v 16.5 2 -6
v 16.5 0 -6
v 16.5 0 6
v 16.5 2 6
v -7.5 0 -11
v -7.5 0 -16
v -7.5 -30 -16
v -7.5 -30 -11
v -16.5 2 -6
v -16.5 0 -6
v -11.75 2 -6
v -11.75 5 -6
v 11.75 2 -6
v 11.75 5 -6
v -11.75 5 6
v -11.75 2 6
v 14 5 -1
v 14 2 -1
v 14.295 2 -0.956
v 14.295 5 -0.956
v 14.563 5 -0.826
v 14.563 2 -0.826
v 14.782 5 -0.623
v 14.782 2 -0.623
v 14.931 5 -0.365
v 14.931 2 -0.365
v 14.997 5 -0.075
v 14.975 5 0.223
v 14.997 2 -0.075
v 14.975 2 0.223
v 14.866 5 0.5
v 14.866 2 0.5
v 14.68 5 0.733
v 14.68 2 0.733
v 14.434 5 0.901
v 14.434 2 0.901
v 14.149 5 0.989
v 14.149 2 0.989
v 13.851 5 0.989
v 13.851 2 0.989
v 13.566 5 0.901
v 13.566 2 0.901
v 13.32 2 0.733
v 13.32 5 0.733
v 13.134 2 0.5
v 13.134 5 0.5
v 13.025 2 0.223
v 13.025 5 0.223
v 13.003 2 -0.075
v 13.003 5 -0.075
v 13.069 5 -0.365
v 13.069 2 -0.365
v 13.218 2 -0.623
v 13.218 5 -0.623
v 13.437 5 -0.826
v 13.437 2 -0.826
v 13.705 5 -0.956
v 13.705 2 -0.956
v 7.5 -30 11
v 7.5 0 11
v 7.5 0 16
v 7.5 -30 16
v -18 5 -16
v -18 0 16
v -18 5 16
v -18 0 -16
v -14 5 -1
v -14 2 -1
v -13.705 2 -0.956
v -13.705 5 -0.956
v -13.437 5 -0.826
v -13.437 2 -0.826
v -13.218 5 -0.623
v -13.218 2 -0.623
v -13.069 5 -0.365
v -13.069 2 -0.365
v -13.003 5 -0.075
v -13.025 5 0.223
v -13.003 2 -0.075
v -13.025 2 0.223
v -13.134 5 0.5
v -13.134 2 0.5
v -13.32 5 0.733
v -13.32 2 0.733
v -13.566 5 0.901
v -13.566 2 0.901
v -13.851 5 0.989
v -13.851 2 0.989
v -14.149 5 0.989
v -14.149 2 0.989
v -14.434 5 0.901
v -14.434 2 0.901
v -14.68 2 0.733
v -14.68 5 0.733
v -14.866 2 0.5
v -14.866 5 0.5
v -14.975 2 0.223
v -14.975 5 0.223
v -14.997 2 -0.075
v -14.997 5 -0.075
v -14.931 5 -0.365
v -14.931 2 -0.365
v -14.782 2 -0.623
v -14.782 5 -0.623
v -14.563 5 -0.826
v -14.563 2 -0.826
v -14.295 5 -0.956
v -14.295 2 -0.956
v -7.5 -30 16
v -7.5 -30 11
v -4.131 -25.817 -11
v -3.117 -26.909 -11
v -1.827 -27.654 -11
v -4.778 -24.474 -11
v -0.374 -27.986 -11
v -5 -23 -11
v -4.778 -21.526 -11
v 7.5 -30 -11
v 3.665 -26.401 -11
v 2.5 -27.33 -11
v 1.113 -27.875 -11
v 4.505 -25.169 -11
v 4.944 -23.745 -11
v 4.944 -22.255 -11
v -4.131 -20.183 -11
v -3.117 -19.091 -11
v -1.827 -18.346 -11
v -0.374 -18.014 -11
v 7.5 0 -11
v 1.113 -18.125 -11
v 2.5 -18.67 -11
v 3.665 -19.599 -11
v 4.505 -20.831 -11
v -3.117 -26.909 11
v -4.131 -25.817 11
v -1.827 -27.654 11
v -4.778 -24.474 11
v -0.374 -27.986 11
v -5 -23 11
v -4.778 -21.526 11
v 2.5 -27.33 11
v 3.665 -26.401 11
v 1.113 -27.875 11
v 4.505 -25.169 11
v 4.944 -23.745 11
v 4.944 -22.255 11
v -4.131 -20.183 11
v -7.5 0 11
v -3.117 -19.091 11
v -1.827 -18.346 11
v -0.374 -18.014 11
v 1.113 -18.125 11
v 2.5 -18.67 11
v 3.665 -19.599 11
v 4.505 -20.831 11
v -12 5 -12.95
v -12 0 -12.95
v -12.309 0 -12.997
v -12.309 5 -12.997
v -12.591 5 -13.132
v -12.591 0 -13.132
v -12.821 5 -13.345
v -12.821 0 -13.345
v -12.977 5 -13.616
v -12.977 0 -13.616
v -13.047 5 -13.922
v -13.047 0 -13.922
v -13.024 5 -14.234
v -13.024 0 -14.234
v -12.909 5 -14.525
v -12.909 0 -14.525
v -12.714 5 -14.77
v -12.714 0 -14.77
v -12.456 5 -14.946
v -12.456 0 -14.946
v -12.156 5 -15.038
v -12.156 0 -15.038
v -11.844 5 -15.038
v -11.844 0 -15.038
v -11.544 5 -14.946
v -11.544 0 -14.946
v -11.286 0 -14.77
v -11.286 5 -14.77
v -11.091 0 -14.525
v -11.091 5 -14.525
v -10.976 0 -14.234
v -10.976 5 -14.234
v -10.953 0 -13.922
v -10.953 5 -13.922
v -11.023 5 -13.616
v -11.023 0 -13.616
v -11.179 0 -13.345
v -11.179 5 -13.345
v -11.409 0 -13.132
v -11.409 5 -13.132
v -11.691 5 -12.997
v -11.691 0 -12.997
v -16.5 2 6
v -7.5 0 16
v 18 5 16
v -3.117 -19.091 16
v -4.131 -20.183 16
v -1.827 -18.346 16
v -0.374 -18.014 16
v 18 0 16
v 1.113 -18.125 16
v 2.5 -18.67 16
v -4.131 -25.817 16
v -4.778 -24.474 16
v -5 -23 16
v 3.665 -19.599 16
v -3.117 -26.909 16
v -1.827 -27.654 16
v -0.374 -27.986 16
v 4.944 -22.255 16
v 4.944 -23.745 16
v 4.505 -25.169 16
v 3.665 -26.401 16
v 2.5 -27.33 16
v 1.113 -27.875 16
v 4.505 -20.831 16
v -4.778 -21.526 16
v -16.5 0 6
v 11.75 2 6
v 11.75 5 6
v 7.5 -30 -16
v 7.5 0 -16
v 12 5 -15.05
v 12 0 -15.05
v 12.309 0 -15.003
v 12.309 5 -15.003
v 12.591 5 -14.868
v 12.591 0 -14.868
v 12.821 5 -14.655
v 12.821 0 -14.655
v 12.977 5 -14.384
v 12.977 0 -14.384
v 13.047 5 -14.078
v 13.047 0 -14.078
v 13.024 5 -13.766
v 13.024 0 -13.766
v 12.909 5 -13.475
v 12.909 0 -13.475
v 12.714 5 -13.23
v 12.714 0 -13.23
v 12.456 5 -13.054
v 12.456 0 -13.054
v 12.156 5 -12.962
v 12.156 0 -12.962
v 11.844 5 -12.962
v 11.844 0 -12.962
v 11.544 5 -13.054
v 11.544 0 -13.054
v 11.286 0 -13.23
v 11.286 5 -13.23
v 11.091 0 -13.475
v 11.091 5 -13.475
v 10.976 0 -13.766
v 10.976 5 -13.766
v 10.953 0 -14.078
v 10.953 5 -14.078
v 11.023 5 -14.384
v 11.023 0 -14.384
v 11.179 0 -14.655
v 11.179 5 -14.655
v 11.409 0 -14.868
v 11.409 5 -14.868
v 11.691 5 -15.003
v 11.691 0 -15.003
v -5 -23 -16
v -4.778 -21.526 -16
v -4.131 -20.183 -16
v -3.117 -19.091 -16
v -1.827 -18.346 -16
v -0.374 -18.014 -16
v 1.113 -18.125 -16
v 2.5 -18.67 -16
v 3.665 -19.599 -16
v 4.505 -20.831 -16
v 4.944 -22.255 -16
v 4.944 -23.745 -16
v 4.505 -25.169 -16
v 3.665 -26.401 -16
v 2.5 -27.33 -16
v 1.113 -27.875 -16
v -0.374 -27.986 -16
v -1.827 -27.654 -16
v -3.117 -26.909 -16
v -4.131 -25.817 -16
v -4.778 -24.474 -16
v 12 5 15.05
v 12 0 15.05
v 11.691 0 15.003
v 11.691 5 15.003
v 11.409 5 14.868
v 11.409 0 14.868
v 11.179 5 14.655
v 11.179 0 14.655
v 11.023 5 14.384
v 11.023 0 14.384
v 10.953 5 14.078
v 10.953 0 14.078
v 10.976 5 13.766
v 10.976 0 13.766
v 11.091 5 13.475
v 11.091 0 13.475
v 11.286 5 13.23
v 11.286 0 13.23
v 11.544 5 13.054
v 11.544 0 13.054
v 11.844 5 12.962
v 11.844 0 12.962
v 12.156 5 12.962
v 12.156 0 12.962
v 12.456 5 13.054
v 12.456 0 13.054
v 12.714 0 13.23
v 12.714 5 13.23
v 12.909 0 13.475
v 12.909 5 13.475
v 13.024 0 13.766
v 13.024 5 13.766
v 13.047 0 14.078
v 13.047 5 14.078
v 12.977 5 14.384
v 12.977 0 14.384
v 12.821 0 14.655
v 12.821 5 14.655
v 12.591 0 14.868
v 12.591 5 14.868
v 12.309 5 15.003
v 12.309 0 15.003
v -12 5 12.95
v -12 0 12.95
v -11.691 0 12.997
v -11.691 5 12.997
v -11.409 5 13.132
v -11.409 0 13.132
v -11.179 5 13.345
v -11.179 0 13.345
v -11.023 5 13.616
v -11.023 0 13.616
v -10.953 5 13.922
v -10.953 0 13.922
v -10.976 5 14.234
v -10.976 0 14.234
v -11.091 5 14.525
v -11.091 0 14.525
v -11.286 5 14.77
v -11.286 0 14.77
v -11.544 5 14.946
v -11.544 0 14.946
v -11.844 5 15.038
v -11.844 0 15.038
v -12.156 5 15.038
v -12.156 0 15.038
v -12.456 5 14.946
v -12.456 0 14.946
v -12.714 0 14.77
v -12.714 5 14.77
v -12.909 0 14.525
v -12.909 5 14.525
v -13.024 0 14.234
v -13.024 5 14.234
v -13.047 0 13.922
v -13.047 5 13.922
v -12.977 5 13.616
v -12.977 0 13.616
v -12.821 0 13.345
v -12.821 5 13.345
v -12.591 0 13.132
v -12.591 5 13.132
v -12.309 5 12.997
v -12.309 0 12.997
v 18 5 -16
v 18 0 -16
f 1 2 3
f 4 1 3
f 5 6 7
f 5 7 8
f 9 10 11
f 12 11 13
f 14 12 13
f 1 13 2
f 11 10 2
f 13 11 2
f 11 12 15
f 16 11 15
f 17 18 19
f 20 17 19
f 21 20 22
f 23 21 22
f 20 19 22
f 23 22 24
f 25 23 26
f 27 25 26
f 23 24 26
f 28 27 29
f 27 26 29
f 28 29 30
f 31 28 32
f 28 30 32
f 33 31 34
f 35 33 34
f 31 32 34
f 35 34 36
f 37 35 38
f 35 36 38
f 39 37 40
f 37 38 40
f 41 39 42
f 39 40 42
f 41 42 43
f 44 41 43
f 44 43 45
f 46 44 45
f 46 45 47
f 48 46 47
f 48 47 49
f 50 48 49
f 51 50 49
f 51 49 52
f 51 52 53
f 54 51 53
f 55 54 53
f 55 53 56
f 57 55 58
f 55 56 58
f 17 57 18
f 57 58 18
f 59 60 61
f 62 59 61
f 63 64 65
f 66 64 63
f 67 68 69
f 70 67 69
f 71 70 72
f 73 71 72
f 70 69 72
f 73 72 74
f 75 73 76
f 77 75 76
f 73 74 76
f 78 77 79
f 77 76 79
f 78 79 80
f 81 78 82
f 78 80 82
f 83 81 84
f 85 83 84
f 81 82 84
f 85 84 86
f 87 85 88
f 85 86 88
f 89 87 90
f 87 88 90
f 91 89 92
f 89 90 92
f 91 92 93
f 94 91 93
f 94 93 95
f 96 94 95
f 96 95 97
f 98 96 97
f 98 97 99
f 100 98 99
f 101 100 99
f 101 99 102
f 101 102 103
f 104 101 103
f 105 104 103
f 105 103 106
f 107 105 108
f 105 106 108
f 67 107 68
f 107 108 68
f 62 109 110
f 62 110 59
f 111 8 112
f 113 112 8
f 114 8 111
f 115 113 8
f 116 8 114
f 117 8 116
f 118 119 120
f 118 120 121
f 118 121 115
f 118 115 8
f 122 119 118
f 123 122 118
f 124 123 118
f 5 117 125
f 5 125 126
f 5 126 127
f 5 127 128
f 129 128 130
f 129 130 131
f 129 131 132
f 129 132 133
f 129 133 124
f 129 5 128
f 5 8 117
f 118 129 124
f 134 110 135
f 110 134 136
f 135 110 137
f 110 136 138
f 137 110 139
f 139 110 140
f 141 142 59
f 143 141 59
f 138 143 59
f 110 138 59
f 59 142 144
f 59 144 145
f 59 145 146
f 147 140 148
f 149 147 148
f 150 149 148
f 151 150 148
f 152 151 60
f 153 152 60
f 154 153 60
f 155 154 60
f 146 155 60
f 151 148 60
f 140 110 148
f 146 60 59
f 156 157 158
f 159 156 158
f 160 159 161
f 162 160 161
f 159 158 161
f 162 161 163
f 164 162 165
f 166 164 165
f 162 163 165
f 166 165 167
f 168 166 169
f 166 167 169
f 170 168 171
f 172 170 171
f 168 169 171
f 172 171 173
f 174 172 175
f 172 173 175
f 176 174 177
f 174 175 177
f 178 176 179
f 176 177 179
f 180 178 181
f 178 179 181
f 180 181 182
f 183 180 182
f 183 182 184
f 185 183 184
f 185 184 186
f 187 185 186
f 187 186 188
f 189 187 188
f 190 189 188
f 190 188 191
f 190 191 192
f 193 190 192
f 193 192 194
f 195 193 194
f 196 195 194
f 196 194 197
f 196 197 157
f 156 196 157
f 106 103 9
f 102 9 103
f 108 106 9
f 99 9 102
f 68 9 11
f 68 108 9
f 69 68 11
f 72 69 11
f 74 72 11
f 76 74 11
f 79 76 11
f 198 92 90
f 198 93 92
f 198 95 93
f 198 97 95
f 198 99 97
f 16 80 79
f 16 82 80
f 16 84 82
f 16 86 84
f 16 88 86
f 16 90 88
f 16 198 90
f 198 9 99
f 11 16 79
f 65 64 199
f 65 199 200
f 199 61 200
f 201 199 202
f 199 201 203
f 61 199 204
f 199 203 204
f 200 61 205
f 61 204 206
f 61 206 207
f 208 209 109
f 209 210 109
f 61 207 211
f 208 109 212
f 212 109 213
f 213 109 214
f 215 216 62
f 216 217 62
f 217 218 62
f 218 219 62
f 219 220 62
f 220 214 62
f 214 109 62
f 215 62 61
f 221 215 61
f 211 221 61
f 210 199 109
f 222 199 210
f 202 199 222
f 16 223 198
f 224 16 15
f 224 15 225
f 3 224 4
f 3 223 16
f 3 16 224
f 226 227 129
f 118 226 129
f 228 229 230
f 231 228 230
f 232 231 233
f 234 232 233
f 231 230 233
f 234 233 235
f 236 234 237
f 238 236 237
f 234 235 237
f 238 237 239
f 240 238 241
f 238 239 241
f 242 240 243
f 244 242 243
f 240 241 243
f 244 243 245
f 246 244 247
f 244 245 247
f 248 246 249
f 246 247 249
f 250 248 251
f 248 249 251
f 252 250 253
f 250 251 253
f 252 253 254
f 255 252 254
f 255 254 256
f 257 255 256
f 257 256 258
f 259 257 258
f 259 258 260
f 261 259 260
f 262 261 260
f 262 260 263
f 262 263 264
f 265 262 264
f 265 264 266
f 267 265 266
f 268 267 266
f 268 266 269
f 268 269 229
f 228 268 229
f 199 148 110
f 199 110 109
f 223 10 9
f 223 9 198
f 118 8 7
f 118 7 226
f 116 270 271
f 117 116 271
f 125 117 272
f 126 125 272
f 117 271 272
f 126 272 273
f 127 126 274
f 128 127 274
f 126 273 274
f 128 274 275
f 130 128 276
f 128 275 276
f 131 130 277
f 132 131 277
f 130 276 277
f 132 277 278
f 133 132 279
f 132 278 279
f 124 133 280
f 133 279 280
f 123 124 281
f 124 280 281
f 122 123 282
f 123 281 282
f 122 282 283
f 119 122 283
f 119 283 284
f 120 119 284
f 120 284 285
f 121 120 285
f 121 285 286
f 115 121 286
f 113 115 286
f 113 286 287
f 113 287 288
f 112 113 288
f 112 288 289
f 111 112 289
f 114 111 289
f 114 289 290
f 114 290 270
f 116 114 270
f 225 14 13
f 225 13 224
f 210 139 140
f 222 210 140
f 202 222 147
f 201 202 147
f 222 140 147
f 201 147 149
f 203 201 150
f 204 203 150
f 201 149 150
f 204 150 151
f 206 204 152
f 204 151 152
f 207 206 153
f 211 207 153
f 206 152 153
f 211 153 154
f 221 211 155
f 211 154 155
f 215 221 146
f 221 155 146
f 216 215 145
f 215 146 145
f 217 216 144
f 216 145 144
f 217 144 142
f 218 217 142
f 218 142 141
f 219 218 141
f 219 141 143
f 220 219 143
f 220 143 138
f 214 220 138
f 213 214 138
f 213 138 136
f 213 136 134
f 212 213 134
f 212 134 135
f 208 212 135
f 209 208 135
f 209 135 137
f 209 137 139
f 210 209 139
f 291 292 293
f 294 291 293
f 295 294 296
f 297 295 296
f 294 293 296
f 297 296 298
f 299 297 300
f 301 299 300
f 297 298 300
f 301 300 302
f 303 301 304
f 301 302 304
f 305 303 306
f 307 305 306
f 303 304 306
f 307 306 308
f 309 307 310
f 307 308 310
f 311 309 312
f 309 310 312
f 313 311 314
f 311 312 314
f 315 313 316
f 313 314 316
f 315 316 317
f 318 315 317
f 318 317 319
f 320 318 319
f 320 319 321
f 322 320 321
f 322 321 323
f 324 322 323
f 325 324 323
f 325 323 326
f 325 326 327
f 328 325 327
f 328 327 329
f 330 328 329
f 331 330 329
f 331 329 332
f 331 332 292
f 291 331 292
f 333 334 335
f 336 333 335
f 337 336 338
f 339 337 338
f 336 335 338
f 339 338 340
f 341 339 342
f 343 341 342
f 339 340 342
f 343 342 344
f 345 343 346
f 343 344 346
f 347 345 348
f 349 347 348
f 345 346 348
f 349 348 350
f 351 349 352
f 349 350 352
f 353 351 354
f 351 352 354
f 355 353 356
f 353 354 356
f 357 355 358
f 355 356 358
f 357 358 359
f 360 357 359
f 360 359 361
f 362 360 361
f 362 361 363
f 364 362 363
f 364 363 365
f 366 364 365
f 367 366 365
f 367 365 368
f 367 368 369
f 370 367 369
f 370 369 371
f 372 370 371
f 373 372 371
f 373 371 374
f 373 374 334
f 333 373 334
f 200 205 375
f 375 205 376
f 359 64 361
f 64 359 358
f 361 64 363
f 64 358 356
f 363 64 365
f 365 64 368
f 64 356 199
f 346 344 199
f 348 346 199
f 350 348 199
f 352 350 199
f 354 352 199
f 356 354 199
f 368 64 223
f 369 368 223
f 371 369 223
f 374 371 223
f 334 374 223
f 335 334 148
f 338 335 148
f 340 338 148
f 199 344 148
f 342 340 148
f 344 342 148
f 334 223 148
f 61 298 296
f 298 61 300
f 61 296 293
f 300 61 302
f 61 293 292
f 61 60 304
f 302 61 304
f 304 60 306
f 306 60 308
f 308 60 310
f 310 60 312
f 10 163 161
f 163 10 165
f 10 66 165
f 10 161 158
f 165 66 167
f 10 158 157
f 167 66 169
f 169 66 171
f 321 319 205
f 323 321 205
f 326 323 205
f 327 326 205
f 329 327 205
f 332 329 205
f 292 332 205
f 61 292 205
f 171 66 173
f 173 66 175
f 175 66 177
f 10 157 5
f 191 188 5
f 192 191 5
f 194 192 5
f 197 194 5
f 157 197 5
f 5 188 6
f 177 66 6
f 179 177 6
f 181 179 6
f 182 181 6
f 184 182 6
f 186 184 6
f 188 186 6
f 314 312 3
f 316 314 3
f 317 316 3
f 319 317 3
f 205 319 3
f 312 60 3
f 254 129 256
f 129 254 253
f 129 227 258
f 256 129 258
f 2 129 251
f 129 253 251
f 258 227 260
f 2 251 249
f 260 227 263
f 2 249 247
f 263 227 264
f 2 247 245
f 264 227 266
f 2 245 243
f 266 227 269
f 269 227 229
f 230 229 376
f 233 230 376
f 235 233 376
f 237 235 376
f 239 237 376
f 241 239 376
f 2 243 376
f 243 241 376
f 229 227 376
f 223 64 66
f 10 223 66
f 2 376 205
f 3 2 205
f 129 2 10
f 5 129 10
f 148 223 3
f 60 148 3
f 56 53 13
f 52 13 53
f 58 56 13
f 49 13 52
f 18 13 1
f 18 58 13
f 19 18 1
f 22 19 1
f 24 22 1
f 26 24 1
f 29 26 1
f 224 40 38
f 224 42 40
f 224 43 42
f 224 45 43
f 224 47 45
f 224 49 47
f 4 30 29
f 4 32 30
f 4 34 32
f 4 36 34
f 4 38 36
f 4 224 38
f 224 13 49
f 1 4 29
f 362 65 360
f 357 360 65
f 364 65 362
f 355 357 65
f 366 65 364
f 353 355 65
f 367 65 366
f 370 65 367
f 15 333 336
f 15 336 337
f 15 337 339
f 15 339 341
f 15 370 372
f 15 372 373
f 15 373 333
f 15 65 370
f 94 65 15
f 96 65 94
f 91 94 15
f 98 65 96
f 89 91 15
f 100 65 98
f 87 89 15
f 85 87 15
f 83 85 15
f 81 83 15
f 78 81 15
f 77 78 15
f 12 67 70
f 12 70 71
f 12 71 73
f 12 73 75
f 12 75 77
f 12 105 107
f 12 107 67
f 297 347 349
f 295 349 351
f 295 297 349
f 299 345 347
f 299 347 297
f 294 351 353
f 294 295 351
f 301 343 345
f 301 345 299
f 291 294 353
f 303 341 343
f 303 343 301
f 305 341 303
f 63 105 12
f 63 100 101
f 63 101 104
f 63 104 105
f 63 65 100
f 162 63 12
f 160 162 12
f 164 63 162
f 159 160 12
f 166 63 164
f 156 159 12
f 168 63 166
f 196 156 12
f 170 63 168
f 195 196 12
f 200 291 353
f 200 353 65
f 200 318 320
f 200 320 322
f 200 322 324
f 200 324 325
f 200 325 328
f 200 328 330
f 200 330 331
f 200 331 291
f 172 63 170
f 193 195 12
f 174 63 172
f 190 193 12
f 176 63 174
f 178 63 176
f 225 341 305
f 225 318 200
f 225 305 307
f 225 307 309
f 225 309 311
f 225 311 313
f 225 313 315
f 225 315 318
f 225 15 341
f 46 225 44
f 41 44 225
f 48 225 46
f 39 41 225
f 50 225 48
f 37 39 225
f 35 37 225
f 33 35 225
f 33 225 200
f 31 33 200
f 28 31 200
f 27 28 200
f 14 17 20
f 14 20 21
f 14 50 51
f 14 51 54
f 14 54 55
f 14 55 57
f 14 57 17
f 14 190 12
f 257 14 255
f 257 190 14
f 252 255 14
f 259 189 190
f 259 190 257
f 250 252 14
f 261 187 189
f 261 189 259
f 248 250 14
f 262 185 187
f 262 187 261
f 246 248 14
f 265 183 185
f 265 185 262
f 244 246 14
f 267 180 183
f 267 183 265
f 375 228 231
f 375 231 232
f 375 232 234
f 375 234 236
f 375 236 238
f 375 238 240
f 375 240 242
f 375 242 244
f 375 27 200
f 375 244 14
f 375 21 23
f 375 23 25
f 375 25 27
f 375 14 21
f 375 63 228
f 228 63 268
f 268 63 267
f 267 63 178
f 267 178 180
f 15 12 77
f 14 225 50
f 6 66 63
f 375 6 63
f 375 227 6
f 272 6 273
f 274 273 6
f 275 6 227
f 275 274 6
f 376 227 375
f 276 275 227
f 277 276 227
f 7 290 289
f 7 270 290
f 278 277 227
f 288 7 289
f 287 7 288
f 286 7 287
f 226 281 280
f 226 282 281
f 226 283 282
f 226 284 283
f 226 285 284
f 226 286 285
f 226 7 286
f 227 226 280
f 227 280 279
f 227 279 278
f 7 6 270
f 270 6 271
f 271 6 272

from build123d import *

# Parameters (mm, degrees)
SKETCH_1_W               = 36
SKETCH_1_H               = 32
EXTRUDE_1_DEPTH          = 5
SKETCH_4_W               = 33
SKETCH_4_H               = 12
CUT_EXTRUDE_2_DEPTH      = 2
SKETCH_8_R               = 1
CUT_EXTRUDE_6_DEPTH      = 3
CUT_EXTRUDE_3_DEPTH      = 25.269322199
CUT_EXTRUDE_3_DEPTH_BACK = 3
SKETCH_5_W               = 23.5
SKETCH_5_H               = 12
SKETCH_11_W              = 15
SKETCH_11_H              = 5
EXTRUDE_3_DEPTH          = 30
CUT_EXTRUDE_8_REACH      = 49.413
SKETCH_12_R              = 5
CUT_EXTRUDE_9_REACH      = 40.471
SKETCH_13_R              = 1.05


with BuildPart() as part:
    # 草图1 → 凸台-拉伸1 (new body)
    with BuildSketch(Plane(origin=(0, 0, 0), x_dir=(1, 0, 0), z_dir=(0, 1, 0))):
        Rectangle(SKETCH_1_W, SKETCH_1_H)
    extrude(amount=EXTRUDE_1_DEPTH)

    # 草图4 → 切除-拉伸2 (cut)
    with BuildSketch(Plane.XZ):
        Rectangle(SKETCH_4_W, SKETCH_4_H)
    extrude(amount=-CUT_EXTRUDE_2_DEPTH, mode=Mode.SUBTRACT)

    # 草图8 → 切除-拉伸6 (cut)
    with BuildSketch(Plane.XZ.offset(-2)):
        with Locations(Location((14, 0, 0), (0, 0, 270))):
            Circle(SKETCH_8_R)
        with Locations(Location((-14, 0, 0), (0, 0, 270))):
            Circle(SKETCH_8_R)
    extrude(amount=-CUT_EXTRUDE_6_DEPTH, mode=Mode.SUBTRACT)

    # 草图5 → 切除-拉伸3 (cut, two sides: drawn at the far end of the back side and taken through both)
    with BuildSketch(Plane.XZ.offset(-2).offset(-CUT_EXTRUDE_3_DEPTH_BACK)):
        Rectangle(SKETCH_5_W, SKETCH_5_H)
    extrude(amount=CUT_EXTRUDE_3_DEPTH + CUT_EXTRUDE_3_DEPTH_BACK, mode=Mode.SUBTRACT)

    # 草图11 → 凸台-拉伸3 (add)
    with BuildSketch(Plane.XZ):
        with Locations((0, 13.5)):
            Rectangle(SKETCH_11_W, SKETCH_11_H)
        with Locations((0, -13.5)):
            Rectangle(SKETCH_11_W, SKETCH_11_H)
    extrude(amount=EXTRUDE_3_DEPTH)

    # 切除-拉伸8: up to this face of the body (flat: up to its plane)
    cut_extrude_8_end = Plane(part.part.faces().sort_by_distance((0, -10, 16))[0])
    # 草图12 → 切除-拉伸8 (cut, up to the picked face)
    with BuildSketch(Plane(origin=(0, 0, -16), x_dir=(-1, 0, 0), z_dir=(0, 0, -1)), mode=Mode.PRIVATE) as cut_extrude_8_sk1:
        with Locations((0, -23)):
            Circle(SKETCH_12_R)
    cut_extrude_8_tool1 = split(extrude(cut_extrude_8_sk1.sketch, amount=-CUT_EXTRUDE_8_REACH, mode=Mode.PRIVATE), bisect_by=cut_extrude_8_end, keep=Keep.BOTH, mode=Mode.PRIVATE)
    add(cut_extrude_8_tool1.solids().sort_by(Axis((0, -23, -16), (0, 0, 1)))[0], mode=Mode.SUBTRACT)

    # 草图13 → 切除-拉伸9 (cut, up to next)
    with BuildSketch(Plane.XZ, mode=Mode.PRIVATE) as cut_extrude_9_sk1:
        with Locations(Location((-12, 14, 0), (0, 0, 270))):
            Circle(SKETCH_13_R)
    cut_extrude_9_tool1 = extrude(cut_extrude_9_sk1.sketch, amount=-CUT_EXTRUDE_9_REACH, mode=Mode.PRIVATE) & part.part
    # 草图13 → 切除-拉伸9 (cut, up to next)
    with BuildSketch(Plane.XZ, mode=Mode.PRIVATE) as cut_extrude_9_sk2:
        with Locations(Location((12, 14, 0), (0, 0, 90))):
            Circle(SKETCH_13_R)
    cut_extrude_9_tool2 = extrude(cut_extrude_9_sk2.sketch, amount=-CUT_EXTRUDE_9_REACH, mode=Mode.PRIVATE) & part.part
    # 草图13 → 切除-拉伸9 (cut, up to next)
    with BuildSketch(Plane.XZ, mode=Mode.PRIVATE) as cut_extrude_9_sk3:
        with Locations(Location((12, -14, 0), (0, 0, 270))):
            Circle(SKETCH_13_R)
    cut_extrude_9_tool3 = extrude(cut_extrude_9_sk3.sketch, amount=-CUT_EXTRUDE_9_REACH, mode=Mode.PRIVATE) & part.part
    # 草图13 → 切除-拉伸9 (cut, up to next)
    with BuildSketch(Plane.XZ, mode=Mode.PRIVATE) as cut_extrude_9_sk4:
        with Locations(Location((-12, -14, 0), (0, 0, 90))):
            Circle(SKETCH_13_R)
    cut_extrude_9_tool4 = extrude(cut_extrude_9_sk4.sketch, amount=-CUT_EXTRUDE_9_REACH, mode=Mode.PRIVATE) & part.part
    add(cut_extrude_9_tool1.solids().sort_by_distance((-12, 0, 14))[0], mode=Mode.SUBTRACT)
    add(cut_extrude_9_tool2.solids().sort_by_distance((12, 0, 14))[0], mode=Mode.SUBTRACT)
    add(cut_extrude_9_tool3.solids().sort_by_distance((12, 0, -14))[0], mode=Mode.SUBTRACT)
    add(cut_extrude_9_tool4.solids().sort_by_distance((-12, 0, -14))[0], mode=Mode.SUBTRACT)


solid = part.part
